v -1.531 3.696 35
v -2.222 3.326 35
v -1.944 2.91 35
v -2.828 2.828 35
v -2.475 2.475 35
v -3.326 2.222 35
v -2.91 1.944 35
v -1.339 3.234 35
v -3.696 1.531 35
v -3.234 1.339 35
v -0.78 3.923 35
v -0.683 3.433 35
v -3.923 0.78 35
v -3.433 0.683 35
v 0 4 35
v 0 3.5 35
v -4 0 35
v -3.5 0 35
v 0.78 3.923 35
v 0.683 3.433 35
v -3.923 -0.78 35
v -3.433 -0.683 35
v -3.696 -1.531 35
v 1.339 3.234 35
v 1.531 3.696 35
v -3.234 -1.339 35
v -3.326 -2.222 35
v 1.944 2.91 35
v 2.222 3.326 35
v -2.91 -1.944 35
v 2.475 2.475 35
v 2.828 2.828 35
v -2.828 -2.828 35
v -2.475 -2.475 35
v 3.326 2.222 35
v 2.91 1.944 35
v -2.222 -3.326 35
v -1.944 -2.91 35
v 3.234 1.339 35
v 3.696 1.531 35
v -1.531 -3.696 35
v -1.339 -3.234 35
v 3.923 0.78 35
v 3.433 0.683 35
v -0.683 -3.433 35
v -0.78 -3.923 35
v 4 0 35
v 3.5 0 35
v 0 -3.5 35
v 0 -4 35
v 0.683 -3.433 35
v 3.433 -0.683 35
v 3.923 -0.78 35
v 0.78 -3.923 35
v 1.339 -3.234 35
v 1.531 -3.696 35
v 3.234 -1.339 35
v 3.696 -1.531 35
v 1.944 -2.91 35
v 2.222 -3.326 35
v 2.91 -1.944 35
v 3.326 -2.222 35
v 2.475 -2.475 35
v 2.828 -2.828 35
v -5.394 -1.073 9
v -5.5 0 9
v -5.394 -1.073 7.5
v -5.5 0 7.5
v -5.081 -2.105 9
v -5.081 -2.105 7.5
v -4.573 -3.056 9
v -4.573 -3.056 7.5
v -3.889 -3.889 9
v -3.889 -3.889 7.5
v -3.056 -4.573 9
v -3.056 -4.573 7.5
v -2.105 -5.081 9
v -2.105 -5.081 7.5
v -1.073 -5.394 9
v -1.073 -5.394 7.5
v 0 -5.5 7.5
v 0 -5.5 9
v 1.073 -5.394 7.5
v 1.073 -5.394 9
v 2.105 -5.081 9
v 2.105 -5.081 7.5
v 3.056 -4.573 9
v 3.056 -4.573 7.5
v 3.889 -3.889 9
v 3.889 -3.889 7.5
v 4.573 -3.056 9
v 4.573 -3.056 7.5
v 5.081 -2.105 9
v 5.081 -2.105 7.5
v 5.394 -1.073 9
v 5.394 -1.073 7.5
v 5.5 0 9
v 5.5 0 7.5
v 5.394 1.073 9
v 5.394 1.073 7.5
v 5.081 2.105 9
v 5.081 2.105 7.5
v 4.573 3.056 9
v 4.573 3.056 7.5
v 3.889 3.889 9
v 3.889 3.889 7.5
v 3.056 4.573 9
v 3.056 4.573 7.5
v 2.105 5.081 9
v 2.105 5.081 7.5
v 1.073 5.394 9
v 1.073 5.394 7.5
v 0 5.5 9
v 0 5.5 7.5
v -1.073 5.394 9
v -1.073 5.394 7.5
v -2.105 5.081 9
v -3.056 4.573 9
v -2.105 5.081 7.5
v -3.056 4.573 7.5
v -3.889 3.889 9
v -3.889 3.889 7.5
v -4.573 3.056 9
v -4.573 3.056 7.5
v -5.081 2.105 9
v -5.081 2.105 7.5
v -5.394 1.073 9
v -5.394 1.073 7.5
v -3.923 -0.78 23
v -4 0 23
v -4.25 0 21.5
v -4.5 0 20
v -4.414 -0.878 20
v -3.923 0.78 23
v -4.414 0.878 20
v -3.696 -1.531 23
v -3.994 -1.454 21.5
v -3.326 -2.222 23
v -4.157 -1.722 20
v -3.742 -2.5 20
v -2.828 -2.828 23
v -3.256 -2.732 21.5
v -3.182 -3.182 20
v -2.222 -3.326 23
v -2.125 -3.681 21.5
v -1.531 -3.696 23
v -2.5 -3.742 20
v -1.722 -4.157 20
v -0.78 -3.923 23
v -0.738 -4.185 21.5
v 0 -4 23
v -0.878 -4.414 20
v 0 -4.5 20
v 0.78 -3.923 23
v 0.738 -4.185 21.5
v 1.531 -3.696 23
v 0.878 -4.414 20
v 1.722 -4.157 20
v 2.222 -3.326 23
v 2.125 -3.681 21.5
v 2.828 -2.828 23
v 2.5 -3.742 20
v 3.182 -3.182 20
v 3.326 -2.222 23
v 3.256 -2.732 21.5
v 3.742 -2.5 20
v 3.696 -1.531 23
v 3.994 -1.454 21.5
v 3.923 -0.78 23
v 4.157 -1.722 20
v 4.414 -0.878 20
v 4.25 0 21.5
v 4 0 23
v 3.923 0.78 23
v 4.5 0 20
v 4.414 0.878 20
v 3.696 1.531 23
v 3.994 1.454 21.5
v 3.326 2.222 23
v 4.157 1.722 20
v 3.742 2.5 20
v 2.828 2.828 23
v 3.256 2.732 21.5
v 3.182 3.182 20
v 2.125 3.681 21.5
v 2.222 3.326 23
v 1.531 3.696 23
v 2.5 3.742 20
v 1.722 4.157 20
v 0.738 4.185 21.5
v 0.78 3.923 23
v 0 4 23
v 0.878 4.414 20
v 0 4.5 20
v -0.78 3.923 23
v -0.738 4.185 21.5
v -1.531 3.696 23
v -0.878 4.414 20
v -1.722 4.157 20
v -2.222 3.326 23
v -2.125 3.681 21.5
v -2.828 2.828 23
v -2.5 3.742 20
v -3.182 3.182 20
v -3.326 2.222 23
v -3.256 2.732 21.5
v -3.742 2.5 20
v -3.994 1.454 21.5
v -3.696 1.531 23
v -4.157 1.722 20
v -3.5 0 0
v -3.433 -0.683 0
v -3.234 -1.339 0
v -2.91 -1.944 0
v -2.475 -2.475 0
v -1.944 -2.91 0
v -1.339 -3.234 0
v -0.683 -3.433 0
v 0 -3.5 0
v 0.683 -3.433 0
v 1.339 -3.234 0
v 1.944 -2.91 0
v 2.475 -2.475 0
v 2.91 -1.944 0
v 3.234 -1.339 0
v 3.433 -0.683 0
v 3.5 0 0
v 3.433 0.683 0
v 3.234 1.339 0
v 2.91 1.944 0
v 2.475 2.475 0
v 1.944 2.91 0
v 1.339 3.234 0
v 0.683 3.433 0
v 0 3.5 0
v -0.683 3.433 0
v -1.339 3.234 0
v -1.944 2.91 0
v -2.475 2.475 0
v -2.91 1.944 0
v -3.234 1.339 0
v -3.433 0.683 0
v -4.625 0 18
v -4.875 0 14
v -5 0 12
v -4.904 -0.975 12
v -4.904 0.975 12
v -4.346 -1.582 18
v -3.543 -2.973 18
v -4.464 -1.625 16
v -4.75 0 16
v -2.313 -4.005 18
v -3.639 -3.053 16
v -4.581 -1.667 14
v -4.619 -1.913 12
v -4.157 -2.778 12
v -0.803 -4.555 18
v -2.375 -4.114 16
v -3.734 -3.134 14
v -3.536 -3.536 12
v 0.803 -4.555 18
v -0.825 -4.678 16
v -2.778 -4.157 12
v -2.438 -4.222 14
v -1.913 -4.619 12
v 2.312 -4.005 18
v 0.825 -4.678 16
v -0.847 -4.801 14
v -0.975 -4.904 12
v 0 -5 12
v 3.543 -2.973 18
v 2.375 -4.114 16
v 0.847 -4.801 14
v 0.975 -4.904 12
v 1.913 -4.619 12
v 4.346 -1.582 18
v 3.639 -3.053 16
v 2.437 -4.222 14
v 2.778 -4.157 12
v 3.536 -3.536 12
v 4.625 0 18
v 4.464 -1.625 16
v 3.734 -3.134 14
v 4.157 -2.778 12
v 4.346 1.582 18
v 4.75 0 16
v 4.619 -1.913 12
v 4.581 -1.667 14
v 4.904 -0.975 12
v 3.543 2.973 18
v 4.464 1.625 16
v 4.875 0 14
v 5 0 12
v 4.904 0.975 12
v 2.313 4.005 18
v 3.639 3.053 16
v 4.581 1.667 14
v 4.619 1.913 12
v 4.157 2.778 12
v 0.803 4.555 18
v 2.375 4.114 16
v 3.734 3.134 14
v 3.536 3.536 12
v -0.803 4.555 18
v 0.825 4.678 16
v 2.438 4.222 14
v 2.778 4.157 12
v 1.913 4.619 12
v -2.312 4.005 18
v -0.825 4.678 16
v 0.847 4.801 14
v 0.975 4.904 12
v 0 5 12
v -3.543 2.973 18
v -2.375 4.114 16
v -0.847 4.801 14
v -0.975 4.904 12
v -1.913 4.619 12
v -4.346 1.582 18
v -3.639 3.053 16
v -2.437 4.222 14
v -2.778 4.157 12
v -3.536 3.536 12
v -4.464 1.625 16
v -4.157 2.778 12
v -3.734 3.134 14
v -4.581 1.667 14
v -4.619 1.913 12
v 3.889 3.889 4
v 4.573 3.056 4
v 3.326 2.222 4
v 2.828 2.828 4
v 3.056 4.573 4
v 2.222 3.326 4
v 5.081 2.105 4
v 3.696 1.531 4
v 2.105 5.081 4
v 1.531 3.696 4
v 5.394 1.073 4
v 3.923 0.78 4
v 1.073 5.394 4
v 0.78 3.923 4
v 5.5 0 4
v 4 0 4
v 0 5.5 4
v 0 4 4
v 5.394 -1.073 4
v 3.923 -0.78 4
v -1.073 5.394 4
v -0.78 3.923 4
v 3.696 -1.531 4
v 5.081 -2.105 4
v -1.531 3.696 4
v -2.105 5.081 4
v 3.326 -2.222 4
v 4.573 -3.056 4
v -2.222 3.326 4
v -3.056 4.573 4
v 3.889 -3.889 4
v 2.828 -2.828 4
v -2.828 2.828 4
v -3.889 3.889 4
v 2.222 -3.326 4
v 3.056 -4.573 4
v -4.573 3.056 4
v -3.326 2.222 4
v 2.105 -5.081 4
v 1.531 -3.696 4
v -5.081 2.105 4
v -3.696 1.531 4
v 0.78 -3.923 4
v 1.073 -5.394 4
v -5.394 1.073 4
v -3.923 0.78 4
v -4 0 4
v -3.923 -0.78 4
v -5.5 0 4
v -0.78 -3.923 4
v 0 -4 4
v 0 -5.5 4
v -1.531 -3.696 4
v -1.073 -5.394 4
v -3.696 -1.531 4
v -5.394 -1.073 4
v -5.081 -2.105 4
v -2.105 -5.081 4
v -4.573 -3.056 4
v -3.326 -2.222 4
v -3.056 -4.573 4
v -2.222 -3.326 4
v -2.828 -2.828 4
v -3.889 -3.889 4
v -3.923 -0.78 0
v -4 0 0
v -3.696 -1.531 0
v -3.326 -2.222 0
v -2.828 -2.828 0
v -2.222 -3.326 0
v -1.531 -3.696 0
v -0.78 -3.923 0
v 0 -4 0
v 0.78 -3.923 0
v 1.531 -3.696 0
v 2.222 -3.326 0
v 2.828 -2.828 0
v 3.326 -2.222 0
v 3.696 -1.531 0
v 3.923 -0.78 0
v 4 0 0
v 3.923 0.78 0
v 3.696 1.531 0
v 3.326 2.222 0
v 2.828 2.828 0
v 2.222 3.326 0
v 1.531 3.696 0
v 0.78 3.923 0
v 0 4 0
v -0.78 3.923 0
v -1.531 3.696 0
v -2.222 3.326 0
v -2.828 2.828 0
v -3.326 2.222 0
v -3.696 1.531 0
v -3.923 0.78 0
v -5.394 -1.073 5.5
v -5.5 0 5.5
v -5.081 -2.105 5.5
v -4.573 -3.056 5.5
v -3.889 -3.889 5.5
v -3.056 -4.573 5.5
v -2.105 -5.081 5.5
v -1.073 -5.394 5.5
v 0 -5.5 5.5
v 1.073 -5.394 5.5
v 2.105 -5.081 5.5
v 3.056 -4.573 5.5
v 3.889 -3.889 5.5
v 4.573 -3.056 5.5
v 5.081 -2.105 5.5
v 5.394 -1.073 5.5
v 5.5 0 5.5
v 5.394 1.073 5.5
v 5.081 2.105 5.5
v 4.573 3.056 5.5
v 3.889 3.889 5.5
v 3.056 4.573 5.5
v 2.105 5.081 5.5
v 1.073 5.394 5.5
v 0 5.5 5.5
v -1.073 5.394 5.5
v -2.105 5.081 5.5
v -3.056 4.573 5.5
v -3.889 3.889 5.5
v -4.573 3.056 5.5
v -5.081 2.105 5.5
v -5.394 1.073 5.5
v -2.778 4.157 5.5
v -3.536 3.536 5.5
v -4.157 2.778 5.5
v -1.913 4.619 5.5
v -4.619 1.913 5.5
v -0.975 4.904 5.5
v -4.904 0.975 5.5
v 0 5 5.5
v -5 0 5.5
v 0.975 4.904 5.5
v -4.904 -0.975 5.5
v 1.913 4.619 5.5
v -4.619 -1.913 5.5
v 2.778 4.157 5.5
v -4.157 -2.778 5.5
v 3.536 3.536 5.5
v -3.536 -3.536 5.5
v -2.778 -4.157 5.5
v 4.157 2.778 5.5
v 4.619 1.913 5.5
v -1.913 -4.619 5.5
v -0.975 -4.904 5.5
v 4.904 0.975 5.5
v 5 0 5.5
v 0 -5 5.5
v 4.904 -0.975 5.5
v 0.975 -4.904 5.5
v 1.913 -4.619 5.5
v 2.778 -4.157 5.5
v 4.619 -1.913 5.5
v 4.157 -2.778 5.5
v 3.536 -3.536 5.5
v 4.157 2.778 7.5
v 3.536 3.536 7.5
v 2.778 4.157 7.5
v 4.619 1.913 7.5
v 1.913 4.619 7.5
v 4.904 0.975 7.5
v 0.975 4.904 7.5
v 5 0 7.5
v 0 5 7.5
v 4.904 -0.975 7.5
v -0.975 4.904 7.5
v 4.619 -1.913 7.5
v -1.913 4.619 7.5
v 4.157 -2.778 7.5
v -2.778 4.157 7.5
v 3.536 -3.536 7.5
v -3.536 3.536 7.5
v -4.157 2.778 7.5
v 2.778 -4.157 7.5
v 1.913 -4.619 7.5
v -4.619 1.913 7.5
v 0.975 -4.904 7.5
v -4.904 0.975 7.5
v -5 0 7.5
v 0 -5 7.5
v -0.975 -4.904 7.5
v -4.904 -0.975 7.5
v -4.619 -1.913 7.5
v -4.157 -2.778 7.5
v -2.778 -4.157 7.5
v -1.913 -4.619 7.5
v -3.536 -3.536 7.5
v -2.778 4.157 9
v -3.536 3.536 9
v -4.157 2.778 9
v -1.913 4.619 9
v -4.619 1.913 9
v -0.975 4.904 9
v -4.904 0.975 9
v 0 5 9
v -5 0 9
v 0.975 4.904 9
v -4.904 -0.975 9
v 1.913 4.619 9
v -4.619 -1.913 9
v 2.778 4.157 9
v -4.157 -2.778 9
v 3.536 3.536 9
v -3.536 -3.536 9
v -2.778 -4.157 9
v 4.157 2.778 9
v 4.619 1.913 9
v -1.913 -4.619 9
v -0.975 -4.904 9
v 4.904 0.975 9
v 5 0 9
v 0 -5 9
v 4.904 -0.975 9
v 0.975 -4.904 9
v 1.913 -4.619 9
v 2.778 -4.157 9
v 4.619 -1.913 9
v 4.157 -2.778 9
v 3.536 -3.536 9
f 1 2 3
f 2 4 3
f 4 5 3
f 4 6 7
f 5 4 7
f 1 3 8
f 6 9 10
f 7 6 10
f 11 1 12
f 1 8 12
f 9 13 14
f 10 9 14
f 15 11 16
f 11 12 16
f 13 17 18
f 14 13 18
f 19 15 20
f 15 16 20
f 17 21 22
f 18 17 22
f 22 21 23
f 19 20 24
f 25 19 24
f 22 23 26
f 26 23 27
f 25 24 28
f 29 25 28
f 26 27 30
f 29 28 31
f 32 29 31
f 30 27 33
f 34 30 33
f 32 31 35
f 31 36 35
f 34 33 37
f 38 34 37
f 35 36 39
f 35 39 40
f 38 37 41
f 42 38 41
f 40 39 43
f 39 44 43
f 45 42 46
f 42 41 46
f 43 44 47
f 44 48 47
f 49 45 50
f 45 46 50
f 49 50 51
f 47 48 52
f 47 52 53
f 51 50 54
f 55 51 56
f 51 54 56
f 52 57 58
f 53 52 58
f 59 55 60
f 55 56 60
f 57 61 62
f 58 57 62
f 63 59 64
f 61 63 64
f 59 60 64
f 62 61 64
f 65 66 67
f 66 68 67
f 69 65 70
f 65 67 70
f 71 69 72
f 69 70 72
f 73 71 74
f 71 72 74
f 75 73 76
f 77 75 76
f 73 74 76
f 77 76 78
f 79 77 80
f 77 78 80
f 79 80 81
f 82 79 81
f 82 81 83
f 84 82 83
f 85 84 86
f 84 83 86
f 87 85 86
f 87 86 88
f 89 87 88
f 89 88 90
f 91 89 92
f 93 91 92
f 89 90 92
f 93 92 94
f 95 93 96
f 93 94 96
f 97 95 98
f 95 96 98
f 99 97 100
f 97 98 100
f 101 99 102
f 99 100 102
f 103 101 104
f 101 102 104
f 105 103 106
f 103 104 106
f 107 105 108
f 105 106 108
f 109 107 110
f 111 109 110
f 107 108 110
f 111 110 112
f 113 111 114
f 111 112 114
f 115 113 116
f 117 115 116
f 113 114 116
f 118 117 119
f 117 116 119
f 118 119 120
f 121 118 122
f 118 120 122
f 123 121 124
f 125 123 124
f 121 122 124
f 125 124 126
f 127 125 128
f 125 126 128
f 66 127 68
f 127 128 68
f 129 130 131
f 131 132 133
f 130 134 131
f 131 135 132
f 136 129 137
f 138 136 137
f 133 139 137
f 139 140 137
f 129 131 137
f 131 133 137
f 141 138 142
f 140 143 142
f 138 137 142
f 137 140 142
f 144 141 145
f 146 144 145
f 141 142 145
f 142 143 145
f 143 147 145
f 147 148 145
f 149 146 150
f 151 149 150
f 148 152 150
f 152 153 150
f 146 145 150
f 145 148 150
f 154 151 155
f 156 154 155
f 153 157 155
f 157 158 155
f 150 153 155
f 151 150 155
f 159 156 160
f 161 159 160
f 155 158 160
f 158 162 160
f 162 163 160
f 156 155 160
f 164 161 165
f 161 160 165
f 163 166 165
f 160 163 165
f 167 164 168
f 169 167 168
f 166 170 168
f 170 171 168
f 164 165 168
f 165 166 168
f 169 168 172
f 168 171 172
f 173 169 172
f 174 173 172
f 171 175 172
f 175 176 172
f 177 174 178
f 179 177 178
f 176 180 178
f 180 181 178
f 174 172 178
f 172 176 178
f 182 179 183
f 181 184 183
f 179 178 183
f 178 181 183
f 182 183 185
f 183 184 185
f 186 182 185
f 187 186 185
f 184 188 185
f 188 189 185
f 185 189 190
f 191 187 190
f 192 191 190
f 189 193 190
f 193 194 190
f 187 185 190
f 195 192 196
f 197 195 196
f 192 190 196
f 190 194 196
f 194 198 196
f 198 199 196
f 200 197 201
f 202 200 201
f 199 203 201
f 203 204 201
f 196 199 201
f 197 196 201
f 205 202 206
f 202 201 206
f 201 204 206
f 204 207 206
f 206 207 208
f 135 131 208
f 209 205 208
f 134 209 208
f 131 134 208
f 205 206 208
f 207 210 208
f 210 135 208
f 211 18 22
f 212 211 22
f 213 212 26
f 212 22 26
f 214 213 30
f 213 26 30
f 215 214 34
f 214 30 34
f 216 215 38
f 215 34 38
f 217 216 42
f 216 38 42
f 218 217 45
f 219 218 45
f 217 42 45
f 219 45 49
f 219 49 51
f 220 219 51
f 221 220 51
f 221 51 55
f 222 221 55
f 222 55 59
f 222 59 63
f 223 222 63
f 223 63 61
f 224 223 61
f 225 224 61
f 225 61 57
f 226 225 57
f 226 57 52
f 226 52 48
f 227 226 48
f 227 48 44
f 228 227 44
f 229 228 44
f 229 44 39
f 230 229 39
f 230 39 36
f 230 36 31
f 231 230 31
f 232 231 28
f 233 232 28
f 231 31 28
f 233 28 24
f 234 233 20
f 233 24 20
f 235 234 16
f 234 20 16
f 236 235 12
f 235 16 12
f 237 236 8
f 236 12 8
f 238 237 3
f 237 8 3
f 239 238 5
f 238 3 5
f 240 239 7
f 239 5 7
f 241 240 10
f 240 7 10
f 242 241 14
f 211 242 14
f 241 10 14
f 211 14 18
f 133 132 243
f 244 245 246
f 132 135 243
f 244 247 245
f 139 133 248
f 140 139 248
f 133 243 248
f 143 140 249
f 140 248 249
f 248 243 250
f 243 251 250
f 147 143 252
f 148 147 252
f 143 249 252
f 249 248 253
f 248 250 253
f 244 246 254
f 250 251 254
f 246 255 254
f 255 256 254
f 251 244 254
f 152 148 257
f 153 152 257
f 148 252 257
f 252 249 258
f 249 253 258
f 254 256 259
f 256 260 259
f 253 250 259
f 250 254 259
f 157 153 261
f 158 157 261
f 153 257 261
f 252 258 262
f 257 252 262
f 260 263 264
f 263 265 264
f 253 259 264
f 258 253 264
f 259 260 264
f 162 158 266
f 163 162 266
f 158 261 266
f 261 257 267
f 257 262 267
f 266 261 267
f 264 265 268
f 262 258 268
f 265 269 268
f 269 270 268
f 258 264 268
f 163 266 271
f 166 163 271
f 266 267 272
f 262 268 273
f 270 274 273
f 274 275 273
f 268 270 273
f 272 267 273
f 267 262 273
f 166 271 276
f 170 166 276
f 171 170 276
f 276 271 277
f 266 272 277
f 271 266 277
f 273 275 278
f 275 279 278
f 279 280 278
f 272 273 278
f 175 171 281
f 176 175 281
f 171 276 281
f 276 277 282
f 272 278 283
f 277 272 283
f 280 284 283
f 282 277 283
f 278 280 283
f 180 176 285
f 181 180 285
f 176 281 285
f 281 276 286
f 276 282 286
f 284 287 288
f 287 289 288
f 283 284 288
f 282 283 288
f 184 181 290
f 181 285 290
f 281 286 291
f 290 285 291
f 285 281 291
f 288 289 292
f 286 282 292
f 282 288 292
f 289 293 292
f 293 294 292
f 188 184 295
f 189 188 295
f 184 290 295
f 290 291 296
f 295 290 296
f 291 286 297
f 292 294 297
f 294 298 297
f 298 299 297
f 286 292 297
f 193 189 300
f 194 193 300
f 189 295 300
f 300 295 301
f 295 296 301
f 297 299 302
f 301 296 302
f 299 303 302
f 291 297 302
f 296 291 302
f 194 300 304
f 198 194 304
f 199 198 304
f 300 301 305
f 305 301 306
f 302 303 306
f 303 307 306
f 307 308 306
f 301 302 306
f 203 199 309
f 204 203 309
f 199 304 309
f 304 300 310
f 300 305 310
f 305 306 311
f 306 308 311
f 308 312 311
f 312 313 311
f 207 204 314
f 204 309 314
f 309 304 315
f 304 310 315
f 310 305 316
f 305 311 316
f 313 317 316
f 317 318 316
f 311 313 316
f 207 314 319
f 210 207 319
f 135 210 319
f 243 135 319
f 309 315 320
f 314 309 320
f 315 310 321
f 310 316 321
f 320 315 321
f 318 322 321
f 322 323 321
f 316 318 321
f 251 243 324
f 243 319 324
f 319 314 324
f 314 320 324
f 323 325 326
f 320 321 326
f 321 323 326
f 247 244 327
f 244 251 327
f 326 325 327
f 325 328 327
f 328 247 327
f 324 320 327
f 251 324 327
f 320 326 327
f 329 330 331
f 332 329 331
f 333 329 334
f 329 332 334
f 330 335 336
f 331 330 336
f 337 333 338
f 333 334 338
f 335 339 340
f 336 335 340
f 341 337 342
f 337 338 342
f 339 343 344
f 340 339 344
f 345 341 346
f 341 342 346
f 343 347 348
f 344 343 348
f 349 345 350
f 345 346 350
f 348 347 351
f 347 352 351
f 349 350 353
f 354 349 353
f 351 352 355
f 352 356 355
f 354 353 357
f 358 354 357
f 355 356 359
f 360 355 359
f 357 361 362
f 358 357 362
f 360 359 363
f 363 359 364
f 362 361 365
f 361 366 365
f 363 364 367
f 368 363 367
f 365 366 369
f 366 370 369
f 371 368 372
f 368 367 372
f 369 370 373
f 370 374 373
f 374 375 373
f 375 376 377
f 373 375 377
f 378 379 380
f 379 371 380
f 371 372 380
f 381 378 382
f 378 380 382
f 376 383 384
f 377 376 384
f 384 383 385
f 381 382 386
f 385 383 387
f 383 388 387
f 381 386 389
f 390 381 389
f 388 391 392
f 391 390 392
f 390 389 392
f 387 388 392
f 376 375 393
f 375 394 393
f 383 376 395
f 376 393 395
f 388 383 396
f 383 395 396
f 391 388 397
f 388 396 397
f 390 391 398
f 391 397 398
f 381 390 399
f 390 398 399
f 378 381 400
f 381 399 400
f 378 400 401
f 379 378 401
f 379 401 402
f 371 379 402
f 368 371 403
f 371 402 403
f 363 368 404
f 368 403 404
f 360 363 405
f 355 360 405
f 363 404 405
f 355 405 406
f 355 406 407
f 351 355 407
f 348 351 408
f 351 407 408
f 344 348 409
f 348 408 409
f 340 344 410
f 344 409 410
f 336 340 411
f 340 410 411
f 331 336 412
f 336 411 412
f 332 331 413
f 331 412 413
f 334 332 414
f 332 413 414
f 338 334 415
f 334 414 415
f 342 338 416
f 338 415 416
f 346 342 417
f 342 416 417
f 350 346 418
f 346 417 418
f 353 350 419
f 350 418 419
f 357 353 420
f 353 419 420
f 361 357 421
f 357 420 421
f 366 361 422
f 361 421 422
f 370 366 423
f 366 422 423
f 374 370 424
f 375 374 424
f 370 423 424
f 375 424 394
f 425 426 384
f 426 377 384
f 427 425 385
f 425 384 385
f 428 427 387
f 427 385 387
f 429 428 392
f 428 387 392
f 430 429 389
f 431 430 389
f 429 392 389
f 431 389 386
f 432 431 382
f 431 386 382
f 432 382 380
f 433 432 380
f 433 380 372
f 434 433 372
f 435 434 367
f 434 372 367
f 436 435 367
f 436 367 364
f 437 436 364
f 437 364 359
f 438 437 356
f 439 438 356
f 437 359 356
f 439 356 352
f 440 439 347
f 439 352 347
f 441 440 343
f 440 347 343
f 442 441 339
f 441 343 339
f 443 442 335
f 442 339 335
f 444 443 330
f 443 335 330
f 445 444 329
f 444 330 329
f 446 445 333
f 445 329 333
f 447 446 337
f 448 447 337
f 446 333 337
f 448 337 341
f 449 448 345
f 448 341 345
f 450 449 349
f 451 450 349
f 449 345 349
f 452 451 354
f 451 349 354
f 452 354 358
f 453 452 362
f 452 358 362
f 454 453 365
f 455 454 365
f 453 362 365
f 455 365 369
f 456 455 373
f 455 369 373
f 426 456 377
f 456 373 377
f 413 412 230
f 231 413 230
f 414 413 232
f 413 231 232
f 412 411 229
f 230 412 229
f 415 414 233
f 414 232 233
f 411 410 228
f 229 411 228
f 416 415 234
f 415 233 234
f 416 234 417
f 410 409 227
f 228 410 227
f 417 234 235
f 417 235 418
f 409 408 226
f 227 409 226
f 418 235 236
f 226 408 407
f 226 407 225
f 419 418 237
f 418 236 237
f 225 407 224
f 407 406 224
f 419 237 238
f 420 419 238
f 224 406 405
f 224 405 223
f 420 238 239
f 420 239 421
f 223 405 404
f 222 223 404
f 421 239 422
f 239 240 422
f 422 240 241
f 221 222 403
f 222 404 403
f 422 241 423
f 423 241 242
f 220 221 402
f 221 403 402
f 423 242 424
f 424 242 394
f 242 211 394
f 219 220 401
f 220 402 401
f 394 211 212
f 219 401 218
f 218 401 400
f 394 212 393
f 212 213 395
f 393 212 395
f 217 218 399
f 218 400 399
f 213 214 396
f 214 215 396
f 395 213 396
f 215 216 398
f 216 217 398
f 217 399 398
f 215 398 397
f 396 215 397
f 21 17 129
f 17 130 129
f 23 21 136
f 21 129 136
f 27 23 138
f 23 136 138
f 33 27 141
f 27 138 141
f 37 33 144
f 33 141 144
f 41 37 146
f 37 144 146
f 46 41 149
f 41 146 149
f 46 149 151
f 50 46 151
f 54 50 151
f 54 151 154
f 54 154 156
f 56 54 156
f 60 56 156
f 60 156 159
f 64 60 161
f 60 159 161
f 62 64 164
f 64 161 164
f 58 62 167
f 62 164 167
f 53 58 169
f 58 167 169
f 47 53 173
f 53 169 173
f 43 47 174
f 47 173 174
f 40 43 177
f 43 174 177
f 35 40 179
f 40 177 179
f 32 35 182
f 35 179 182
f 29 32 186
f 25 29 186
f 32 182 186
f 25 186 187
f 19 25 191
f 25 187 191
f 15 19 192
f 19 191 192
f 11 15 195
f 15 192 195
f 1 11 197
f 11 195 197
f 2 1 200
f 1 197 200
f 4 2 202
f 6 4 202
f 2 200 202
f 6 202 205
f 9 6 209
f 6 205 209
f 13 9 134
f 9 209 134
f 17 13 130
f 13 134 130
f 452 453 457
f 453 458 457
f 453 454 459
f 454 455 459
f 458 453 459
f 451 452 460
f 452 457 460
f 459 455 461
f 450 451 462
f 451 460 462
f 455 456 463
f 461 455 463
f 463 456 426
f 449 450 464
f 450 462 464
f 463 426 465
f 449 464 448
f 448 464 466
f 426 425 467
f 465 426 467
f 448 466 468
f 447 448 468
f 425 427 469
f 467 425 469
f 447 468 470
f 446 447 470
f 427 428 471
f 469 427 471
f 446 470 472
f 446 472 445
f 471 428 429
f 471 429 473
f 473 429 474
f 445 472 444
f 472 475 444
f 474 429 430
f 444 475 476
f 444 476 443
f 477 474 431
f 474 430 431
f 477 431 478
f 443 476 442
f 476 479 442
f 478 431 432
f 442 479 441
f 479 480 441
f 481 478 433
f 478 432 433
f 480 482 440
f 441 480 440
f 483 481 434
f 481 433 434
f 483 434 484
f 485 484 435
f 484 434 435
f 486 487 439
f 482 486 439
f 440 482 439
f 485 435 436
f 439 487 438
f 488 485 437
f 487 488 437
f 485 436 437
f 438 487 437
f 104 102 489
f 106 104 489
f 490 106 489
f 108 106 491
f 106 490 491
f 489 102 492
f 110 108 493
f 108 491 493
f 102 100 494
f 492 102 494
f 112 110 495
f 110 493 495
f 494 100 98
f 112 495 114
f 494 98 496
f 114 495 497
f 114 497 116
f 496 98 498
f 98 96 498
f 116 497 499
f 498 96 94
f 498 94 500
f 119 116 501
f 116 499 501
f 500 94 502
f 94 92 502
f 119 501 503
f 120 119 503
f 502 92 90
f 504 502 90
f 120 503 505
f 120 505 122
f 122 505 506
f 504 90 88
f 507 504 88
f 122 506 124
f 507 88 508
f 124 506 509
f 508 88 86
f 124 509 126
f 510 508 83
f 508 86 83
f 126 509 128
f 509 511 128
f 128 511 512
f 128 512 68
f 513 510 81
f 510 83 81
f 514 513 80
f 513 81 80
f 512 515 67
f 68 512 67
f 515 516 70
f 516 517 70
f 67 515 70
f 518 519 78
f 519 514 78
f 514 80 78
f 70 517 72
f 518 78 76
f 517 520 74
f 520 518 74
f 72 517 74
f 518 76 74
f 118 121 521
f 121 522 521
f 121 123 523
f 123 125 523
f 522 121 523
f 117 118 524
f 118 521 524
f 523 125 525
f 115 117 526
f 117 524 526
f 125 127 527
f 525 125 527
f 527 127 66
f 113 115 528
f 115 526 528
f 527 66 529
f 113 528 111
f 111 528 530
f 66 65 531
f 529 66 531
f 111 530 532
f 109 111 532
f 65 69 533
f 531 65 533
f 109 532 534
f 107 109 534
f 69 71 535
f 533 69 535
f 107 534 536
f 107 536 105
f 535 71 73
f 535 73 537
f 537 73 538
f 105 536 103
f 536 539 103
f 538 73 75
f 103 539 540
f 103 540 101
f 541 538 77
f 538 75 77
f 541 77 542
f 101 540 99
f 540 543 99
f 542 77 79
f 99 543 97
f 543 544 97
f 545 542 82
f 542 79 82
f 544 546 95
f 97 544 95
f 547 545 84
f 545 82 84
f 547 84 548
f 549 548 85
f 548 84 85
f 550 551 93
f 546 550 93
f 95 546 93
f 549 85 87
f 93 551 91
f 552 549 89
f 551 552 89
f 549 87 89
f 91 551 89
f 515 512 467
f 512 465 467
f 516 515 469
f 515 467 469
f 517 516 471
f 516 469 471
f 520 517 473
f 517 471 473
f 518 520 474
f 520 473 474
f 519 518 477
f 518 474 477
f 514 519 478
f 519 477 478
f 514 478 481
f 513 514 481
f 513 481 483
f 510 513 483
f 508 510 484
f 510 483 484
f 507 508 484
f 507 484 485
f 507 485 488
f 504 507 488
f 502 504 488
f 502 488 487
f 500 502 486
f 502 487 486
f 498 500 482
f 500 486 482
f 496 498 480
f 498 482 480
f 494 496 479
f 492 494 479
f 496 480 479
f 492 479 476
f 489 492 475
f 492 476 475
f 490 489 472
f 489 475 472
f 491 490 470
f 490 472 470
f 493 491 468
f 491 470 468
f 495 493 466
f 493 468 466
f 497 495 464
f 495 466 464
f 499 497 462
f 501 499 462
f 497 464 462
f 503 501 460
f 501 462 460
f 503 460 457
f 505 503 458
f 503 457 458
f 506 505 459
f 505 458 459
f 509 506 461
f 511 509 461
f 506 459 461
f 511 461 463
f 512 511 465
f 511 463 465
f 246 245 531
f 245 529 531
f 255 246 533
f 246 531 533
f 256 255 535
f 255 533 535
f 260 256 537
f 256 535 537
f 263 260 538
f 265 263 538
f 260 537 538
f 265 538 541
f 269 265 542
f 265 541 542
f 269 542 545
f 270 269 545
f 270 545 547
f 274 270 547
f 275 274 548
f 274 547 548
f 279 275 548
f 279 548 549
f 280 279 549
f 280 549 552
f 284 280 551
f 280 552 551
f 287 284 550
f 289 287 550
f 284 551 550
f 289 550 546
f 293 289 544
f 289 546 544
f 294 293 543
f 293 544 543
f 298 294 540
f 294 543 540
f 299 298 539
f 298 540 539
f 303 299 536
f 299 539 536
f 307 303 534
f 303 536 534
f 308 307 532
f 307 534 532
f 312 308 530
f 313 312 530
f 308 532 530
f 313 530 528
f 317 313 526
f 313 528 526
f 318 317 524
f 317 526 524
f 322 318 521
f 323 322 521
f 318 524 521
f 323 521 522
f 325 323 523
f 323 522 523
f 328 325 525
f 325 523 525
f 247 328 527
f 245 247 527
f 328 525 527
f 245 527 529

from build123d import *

# Parameters (mm, degrees)
F3_D = 7


with BuildPart() as f1:
    # F0 (on Front) → F1 (revolve)
    with BuildSketch(Plane.XZ):
        Polygon((-4, 0), (0, 0), (0, 35), (-4, 35), (-4, 23), (-4.5, 20), (-5, 12), (-5, 9), (-5.5, 9), (-5.5, 7.5), (-5, 7.5), (-5, 5.5), (-5.5, 5.5), (-5.5, 4), (-4, 4), align=None)
    revolve(axis=Axis((0, 0, 17.5), (0, 0, 1)))

    # F3 (through all)
    with Locations(Plane(origin=(0, 0, 0), x_dir=(1, 0, 0), z_dir=(0, 0, -1))):
        with Locations((0, 0)):
            Hole(F3_D / 2)


solid = f1.part
